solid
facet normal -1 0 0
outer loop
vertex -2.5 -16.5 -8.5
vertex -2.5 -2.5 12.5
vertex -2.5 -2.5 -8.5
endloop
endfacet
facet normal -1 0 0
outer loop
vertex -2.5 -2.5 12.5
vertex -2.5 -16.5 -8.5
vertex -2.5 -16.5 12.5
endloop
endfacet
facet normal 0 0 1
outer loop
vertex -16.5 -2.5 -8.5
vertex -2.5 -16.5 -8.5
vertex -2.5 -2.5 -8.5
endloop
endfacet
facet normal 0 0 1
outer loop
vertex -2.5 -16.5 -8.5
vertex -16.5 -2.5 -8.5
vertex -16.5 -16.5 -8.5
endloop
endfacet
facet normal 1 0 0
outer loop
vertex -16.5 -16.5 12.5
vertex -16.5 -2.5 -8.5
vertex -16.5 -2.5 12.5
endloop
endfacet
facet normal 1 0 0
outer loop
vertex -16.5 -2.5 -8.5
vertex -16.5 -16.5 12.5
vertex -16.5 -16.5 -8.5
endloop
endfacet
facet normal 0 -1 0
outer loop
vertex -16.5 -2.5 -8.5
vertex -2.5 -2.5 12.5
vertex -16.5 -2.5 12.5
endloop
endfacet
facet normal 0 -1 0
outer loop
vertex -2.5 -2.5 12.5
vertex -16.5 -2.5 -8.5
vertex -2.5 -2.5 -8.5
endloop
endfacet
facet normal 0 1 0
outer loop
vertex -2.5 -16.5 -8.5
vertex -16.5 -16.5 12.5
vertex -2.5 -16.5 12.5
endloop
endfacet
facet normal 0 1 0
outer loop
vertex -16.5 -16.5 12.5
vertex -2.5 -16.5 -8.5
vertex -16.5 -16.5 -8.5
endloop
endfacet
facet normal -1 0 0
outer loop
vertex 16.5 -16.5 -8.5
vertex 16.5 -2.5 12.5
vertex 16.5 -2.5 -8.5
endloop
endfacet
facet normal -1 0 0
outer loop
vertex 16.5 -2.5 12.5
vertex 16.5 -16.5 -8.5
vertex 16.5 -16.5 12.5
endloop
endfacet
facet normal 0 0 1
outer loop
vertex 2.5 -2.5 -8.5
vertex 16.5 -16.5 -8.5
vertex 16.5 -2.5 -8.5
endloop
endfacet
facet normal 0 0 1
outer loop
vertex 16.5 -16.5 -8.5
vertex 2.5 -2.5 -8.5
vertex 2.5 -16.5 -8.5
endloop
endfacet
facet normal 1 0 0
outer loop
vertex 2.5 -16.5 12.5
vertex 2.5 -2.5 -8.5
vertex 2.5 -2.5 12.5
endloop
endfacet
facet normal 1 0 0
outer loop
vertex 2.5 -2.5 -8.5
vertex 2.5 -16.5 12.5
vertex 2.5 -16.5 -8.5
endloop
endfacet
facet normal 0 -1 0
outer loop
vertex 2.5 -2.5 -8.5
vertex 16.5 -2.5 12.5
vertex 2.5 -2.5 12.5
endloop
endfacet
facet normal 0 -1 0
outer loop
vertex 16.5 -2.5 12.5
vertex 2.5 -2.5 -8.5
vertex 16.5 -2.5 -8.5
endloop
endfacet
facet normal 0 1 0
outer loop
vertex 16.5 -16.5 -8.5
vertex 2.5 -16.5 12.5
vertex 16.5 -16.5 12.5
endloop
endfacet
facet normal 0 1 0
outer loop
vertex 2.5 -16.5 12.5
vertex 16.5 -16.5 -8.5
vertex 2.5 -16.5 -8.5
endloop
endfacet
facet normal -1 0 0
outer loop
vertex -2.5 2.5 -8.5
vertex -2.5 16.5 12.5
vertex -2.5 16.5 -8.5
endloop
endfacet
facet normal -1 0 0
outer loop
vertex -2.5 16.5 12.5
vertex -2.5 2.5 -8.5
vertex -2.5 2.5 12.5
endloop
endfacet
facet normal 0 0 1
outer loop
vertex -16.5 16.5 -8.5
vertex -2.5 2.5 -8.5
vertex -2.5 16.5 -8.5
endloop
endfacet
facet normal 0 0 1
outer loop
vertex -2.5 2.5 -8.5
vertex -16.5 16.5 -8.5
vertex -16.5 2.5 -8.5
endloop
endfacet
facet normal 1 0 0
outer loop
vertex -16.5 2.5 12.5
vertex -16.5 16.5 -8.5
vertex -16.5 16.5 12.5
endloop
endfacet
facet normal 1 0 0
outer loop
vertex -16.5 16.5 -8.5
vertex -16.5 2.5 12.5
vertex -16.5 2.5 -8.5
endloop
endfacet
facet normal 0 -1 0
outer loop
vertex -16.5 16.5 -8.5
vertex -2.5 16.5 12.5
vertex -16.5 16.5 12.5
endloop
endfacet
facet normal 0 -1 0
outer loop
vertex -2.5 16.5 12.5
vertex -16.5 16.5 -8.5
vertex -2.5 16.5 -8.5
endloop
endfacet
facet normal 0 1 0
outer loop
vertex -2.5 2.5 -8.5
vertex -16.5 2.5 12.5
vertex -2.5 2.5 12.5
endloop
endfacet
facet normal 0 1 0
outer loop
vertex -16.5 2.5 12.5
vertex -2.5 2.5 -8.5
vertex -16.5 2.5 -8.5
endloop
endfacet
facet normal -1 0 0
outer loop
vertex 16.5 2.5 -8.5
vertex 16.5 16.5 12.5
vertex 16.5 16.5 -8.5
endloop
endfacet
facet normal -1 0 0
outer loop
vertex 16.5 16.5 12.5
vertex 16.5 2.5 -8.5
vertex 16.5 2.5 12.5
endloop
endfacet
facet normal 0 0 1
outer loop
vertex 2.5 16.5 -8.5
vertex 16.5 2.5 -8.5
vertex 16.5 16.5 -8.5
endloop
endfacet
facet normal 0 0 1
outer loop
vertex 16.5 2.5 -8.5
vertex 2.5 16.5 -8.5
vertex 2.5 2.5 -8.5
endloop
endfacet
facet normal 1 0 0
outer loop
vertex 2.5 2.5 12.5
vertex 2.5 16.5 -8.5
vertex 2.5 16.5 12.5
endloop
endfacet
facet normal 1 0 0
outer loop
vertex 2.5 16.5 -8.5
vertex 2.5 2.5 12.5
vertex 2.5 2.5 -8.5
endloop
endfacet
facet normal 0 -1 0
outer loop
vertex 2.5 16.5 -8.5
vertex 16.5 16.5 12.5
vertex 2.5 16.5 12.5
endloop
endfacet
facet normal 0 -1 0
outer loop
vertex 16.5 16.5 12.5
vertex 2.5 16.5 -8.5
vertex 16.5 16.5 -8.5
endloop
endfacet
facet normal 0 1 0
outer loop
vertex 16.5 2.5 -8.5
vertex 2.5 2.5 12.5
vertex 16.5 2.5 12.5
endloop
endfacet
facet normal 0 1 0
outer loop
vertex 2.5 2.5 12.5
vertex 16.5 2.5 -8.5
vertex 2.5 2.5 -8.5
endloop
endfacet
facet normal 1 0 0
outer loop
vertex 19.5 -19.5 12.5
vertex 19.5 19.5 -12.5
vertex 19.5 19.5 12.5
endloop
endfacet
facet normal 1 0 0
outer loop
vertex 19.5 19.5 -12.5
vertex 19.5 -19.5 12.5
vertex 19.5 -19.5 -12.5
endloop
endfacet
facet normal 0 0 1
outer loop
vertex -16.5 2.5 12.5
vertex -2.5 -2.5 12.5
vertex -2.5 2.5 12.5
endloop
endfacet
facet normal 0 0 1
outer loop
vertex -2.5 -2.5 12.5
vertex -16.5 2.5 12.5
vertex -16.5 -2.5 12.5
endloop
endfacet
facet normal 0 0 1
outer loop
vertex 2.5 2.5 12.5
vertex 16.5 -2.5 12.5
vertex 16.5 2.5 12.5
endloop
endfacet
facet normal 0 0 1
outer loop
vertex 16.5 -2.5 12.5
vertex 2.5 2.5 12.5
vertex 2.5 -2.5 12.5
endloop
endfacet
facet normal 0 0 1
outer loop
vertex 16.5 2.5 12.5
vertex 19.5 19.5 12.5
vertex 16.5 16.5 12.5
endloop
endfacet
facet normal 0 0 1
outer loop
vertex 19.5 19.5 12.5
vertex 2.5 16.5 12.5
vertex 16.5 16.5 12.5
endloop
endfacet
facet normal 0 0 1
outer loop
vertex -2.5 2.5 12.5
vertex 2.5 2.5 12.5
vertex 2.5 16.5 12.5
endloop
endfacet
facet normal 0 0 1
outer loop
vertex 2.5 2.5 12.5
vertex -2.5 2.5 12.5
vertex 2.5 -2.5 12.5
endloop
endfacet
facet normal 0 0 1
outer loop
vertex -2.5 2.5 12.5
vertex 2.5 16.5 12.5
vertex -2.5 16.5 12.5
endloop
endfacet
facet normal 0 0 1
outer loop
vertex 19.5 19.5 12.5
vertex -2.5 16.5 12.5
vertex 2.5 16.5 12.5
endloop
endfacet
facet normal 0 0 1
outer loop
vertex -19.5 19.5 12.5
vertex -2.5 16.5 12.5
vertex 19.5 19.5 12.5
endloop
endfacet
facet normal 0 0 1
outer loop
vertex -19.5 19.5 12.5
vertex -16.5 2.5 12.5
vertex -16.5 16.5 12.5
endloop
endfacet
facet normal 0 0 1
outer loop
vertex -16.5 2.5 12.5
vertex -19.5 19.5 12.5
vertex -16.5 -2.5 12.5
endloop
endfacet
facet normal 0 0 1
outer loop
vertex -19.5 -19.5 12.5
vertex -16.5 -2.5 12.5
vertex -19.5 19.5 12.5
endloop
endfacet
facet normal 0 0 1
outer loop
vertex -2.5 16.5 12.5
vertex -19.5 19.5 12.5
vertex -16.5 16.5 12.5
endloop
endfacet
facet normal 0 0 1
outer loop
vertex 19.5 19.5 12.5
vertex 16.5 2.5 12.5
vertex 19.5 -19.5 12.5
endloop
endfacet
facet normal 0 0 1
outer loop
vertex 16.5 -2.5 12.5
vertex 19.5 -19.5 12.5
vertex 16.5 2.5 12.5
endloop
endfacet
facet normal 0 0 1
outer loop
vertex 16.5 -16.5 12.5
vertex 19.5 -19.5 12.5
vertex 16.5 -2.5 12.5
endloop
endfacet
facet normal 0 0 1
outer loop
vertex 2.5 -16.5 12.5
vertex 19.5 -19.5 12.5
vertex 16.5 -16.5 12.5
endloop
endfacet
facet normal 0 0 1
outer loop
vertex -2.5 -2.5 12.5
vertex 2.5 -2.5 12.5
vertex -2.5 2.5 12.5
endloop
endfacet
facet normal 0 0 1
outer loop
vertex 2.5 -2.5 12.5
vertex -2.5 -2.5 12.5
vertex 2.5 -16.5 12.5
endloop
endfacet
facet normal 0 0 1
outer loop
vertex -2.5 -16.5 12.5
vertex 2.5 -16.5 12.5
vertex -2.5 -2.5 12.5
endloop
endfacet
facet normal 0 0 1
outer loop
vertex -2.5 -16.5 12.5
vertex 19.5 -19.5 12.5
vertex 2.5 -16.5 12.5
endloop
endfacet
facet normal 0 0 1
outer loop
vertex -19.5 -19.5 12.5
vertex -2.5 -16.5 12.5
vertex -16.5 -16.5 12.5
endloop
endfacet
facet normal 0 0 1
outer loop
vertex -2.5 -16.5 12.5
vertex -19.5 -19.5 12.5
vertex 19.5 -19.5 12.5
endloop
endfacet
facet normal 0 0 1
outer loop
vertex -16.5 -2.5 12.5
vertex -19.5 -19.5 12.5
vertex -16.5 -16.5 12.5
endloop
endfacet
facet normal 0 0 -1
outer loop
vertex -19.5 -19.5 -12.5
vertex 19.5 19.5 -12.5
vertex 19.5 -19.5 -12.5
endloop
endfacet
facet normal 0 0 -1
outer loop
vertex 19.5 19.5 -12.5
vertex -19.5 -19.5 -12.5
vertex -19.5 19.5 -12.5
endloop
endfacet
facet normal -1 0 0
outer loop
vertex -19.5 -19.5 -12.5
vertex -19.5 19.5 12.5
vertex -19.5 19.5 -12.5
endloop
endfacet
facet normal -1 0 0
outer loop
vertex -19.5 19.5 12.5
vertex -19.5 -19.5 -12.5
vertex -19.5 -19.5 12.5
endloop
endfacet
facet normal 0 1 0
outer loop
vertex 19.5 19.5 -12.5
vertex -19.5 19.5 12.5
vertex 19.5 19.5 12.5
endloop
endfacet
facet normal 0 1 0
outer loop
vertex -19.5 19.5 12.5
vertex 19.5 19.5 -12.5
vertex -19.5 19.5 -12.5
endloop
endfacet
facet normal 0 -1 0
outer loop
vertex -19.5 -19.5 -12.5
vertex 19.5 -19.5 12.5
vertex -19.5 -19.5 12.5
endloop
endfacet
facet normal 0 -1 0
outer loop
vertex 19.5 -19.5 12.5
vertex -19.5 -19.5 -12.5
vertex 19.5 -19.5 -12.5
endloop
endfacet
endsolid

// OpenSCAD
$fn = 32;

// ----------------------------------------------------------------------
// Pocket plate 39 x 39 x 25
// 2 x 2 pockets 14 mm square, 21 mm deep
// ----------------------------------------------------------------------

// --- parameters (mm) ---
thickness = 25;  // plate thickness
floor_t = 4;     // material left under each pocket
pocket = 14;     // pocket side length
pitch_x = 19;    // pocket pitch along X
pitch_y = 19;    // pocket pitch along Y
cols = 2;        // pockets per row
rows = 2;        // rows of pockets

// --- derived feature positions (mm) ---
depth = thickness - floor_t;        // = 21   pocket depth, down to the floor
span_x = (cols - 1) * pitch_x;      // = 19   distance between outer pockets
span_y = (rows - 1) * pitch_y;      // = 19   distance between outer pocket rows
origin_x = -span_x / 2;             // = -9.5   X of the first pocket
origin_y = -span_y / 2;             // = -9.5   Y of the first pocket
plate = [span_x + pocket + 6, span_y + pocket + 6, thickness];  // = [39, 39, 25]   overall size: pockets plus 3 mm of wall on each side
feature_centers = [
  [origin_x + 0 * pitch_x, origin_y + 0 * pitch_y],
  [origin_x + 1 * pitch_x, origin_y + 0 * pitch_y],
  [origin_x + 0 * pitch_x, origin_y + 1 * pitch_y],
  [origin_x + 1 * pitch_x, origin_y + 1 * pitch_y]
];   // pocket centres, used verbatim by the cutter loop

// plate outline, then one pocket per centre in feature_centers
difference() {
  cube(plate, center = true);
  for (centre = feature_centers)
    translate([centre[0] - pocket / 2, centre[1] - pocket / 2, plate[2] / 2 - depth])
      cube([pocket, pocket, depth + 1]);  // centred on the declared pocket centre
}
